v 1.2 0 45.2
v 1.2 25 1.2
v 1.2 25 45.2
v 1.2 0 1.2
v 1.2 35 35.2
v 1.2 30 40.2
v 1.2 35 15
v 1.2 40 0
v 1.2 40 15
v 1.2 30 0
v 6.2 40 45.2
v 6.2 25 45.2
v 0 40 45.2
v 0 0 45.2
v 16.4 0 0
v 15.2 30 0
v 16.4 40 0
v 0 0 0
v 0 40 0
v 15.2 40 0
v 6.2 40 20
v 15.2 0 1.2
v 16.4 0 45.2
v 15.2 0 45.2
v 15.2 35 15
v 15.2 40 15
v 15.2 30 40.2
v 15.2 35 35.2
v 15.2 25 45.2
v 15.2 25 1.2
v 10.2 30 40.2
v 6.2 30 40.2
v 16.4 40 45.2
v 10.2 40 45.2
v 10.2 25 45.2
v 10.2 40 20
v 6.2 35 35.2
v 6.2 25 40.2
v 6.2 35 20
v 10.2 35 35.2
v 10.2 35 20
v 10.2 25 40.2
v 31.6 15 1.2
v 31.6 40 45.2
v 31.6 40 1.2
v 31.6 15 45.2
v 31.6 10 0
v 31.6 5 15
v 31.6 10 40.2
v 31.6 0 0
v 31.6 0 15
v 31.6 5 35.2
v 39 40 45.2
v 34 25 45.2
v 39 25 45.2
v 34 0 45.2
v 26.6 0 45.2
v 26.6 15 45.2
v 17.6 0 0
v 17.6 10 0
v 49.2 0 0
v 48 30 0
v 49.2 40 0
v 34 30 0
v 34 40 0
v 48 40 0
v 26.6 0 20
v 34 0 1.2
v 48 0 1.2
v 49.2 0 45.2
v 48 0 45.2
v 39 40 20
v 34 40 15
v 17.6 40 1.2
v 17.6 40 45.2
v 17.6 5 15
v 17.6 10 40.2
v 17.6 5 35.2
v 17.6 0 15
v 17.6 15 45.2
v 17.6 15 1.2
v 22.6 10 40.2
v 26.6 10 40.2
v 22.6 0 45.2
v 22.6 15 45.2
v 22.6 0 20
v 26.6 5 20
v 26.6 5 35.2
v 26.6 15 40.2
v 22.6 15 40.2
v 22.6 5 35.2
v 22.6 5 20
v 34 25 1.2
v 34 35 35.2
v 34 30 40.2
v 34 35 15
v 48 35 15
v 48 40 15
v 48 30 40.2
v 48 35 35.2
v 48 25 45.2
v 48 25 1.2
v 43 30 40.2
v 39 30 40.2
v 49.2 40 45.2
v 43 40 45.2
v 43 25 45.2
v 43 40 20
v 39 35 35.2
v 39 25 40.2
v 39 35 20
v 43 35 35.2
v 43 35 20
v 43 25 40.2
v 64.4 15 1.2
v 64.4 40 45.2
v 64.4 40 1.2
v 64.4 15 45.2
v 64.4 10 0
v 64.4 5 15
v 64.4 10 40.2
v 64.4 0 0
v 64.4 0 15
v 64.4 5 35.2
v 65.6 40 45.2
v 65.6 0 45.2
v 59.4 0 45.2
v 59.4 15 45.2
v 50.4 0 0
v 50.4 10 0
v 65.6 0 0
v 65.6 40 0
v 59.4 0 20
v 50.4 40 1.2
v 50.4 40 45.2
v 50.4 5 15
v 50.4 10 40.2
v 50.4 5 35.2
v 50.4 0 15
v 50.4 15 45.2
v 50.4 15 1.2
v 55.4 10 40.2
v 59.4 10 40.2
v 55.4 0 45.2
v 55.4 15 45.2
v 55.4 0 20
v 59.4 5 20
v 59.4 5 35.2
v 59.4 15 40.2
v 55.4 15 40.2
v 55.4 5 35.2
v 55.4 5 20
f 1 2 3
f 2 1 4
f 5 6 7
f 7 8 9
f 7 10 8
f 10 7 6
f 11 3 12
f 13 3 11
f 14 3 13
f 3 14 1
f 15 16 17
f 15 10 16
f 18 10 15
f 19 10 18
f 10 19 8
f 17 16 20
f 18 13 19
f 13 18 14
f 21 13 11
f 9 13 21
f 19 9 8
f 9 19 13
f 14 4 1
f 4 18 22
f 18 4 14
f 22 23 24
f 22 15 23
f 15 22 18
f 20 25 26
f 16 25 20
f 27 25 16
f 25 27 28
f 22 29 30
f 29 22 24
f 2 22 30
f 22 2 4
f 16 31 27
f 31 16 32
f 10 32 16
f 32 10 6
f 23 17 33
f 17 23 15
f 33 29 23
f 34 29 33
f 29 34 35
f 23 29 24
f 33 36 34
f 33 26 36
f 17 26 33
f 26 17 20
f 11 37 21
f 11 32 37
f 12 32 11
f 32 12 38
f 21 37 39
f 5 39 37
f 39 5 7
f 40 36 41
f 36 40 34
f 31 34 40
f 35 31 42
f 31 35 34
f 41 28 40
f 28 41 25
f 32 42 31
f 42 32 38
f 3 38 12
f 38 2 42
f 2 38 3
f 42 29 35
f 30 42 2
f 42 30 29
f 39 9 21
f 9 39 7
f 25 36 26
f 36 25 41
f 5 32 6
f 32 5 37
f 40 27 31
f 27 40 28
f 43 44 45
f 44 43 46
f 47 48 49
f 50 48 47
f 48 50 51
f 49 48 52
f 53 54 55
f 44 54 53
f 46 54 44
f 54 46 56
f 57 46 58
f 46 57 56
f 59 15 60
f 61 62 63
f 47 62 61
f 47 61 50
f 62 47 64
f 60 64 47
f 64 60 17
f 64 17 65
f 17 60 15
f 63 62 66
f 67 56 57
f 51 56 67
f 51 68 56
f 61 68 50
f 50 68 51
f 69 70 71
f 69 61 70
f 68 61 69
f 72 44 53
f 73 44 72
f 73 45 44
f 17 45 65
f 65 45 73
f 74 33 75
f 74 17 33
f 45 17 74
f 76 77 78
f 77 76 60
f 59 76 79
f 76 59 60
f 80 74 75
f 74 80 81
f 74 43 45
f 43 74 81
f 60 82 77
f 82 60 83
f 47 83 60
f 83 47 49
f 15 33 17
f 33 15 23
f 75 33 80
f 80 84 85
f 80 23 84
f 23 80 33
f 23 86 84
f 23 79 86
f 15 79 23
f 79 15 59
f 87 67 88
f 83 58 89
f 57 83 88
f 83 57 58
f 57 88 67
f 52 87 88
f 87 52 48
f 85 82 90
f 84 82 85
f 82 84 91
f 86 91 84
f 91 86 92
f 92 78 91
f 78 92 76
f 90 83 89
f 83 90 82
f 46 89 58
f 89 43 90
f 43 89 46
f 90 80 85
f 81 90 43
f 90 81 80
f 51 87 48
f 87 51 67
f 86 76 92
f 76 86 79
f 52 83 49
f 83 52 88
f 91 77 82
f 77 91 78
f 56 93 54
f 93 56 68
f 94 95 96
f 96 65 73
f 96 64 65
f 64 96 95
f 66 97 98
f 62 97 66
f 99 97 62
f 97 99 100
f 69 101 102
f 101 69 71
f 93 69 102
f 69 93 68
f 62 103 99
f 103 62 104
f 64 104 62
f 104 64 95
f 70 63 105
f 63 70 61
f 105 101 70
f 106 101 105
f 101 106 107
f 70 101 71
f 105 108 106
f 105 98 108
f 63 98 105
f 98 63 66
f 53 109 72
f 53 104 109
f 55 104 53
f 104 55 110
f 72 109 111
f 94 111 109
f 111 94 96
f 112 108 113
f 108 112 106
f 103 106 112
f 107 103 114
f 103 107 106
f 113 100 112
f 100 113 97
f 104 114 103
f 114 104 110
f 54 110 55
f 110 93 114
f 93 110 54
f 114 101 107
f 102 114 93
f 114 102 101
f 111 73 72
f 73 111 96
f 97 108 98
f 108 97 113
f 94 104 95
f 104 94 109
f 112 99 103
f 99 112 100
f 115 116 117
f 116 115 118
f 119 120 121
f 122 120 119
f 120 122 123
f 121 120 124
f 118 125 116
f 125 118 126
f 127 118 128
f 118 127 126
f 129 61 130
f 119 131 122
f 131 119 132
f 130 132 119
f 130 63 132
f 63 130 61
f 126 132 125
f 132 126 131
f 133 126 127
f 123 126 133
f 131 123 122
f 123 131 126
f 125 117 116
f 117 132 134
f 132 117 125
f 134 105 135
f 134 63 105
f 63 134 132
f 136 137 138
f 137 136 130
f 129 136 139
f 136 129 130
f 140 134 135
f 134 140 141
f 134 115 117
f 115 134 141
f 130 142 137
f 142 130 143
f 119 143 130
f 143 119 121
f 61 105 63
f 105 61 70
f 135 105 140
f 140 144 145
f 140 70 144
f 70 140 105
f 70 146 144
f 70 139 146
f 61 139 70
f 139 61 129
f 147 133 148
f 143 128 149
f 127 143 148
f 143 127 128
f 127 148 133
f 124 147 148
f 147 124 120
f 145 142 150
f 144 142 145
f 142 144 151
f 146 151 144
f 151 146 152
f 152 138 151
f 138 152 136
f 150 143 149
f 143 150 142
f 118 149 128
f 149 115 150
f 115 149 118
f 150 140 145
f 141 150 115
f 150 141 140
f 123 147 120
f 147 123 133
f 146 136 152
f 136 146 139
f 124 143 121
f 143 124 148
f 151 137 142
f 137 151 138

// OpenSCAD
/*
 * Created by:
 * Thomas Buck <xythobuz@xythobuz.de> in November 2016
 *
 * Licensed under the Creative Commons - Attribution license.
 *
 * Based on the Hubsan Battery Magazine by dboyer:
 * https://www.thingiverse.com/thing:1689701
 */

// -----------------------------------------------------------

batteryCount = 4; // Number of batteries you want to store

// Size of one battery (without cable)
batteryWidth = 14;
batteryHeight = 44;
batteryDepth = 25;

wallSize = 1.2; // wall strength
cableDepth = 15; // depth of part added for cable management
bottomCut = 10; // how much space to cut out for the connector
backCut = 20; // another cut at the back
cableRidge = 5; // thickness of cable management edge

// -----------------------------------------------------------

module holder() {
    // battery
    %translate([wallSize, 0, wallSize])
        cube([batteryWidth, batteryDepth, batteryHeight]);
    
    // left wall
    cube([wallSize, batteryDepth + cableDepth, wallSize + batteryHeight]);
    
    // bottom
    translate([wallSize, 0, 0])
        cube([batteryWidth, batteryDepth + cableDepth - bottomCut, wallSize]);
    
    // right wall
    translate([wallSize + batteryWidth, 0, 0])
        cube([wallSize, batteryDepth + cableDepth, wallSize + batteryHeight]);
    
    // back left ridge
    translate([wallSize, batteryDepth + cableDepth - cableRidge, backCut])
        cube([cableRidge, cableRidge, wallSize + batteryHeight - backCut]);
    
    // back right ridge
    translate([wallSize + batteryWidth - cableRidge, batteryDepth + cableDepth - cableRidge, backCut])
        cube([cableRidge, cableRidge, wallSize + batteryHeight - backCut]);
    
    // top left ridge
    translate([wallSize, batteryDepth, wallSize + batteryHeight - cableRidge])
        cube([cableRidge, cableDepth - cableRidge, cableRidge]);
    
    // top right ridge
    translate([wallSize + batteryWidth - cableRidge, batteryDepth, wallSize + batteryHeight - cableRidge])
        cube([cableRidge, cableDepth - cableRidge, cableRidge]);
    
    // left bototm print helper edge
    translate([wallSize + cableRidge, batteryDepth + cableDepth - cableRidge, backCut])
        rotate([0, 0, 90])
        polyhedron(points=[
            [0, 0, 0], [cableRidge, 0, 0], [cableRidge, cableRidge, 0], [0, cableRidge, 0], [0, cableRidge, -cableRidge], [cableRidge, cableRidge, -cableRidge]
        ], faces=[
            [0, 1, 2, 3], [5, 4, 3, 2], [0, 4, 5, 1], [0, 3, 4], [5, 2, 1]
        ]);
    
    // right bottom print helper edge
    translate([wallSize + batteryWidth - cableRidge, batteryDepth + cableDepth - cableRidge, backCut])
        rotate([0, 0, -90])
        polyhedron(points=[
            [0, 0, 0], [-cableRidge, 0, 0], [-cableRidge, cableRidge, 0], [0, cableRidge, 0], [0, cableRidge, -cableRidge], [-cableRidge, cableRidge, -cableRidge]
        ], faces=[
            [0, 1, 2, 3], [5, 4, 3, 2], [0, 4, 5, 1], [0, 3, 4], [5, 2, 1]
        ]);
    
    // left top print helper edge
    translate([wallSize, batteryDepth + cableDepth - (2 * cableRidge), wallSize + batteryHeight - cableRidge])
        polyhedron(points=[
            [0, 0, 0], [cableRidge, 0, 0], [cableRidge, cableRidge, 0], [0, cableRidge, 0], [0, cableRidge, -cableRidge], [cableRidge, cableRidge, -cableRidge]
        ], faces=[
            [0, 1, 2, 3], [5, 4, 3, 2], [0, 4, 5, 1], [0, 3, 4], [5, 2, 1]
        ]);
    
    // right top print helper edge
    translate([wallSize + batteryWidth - cableRidge, batteryDepth + cableDepth - (2 * cableRidge), wallSize + batteryHeight - cableRidge])
        polyhedron(points=[
            [0, 0, 0], [cableRidge, 0, 0], [cableRidge, cableRidge, 0], [0, cableRidge, 0], [0, cableRidge, -cableRidge], [cableRidge, cableRidge, -cableRidge]
        ], faces=[
            [0, 1, 2, 3], [5, 4, 3, 2], [0, 4, 5, 1], [0, 3, 4], [5, 2, 1]
        ]);
    
    // center mass
    translate([wallSize, batteryDepth, wallSize])
        cube([batteryWidth, cableDepth - bottomCut, batteryHeight - cableRidge]);
}

// -----------------------------------------------------------

for (i = [0 : batteryCount - 1]) {
    translate([((i % 2) == 0) ? 0 : batteryWidth + (2 * wallSize), ((i % 2) == 0) ? 0 : batteryDepth + cableDepth, 0])
    translate([i * (batteryWidth + (2 * wallSize)), 0, 0])
    rotate([0, 0, (180 * i) % 360])
    holder();
}
